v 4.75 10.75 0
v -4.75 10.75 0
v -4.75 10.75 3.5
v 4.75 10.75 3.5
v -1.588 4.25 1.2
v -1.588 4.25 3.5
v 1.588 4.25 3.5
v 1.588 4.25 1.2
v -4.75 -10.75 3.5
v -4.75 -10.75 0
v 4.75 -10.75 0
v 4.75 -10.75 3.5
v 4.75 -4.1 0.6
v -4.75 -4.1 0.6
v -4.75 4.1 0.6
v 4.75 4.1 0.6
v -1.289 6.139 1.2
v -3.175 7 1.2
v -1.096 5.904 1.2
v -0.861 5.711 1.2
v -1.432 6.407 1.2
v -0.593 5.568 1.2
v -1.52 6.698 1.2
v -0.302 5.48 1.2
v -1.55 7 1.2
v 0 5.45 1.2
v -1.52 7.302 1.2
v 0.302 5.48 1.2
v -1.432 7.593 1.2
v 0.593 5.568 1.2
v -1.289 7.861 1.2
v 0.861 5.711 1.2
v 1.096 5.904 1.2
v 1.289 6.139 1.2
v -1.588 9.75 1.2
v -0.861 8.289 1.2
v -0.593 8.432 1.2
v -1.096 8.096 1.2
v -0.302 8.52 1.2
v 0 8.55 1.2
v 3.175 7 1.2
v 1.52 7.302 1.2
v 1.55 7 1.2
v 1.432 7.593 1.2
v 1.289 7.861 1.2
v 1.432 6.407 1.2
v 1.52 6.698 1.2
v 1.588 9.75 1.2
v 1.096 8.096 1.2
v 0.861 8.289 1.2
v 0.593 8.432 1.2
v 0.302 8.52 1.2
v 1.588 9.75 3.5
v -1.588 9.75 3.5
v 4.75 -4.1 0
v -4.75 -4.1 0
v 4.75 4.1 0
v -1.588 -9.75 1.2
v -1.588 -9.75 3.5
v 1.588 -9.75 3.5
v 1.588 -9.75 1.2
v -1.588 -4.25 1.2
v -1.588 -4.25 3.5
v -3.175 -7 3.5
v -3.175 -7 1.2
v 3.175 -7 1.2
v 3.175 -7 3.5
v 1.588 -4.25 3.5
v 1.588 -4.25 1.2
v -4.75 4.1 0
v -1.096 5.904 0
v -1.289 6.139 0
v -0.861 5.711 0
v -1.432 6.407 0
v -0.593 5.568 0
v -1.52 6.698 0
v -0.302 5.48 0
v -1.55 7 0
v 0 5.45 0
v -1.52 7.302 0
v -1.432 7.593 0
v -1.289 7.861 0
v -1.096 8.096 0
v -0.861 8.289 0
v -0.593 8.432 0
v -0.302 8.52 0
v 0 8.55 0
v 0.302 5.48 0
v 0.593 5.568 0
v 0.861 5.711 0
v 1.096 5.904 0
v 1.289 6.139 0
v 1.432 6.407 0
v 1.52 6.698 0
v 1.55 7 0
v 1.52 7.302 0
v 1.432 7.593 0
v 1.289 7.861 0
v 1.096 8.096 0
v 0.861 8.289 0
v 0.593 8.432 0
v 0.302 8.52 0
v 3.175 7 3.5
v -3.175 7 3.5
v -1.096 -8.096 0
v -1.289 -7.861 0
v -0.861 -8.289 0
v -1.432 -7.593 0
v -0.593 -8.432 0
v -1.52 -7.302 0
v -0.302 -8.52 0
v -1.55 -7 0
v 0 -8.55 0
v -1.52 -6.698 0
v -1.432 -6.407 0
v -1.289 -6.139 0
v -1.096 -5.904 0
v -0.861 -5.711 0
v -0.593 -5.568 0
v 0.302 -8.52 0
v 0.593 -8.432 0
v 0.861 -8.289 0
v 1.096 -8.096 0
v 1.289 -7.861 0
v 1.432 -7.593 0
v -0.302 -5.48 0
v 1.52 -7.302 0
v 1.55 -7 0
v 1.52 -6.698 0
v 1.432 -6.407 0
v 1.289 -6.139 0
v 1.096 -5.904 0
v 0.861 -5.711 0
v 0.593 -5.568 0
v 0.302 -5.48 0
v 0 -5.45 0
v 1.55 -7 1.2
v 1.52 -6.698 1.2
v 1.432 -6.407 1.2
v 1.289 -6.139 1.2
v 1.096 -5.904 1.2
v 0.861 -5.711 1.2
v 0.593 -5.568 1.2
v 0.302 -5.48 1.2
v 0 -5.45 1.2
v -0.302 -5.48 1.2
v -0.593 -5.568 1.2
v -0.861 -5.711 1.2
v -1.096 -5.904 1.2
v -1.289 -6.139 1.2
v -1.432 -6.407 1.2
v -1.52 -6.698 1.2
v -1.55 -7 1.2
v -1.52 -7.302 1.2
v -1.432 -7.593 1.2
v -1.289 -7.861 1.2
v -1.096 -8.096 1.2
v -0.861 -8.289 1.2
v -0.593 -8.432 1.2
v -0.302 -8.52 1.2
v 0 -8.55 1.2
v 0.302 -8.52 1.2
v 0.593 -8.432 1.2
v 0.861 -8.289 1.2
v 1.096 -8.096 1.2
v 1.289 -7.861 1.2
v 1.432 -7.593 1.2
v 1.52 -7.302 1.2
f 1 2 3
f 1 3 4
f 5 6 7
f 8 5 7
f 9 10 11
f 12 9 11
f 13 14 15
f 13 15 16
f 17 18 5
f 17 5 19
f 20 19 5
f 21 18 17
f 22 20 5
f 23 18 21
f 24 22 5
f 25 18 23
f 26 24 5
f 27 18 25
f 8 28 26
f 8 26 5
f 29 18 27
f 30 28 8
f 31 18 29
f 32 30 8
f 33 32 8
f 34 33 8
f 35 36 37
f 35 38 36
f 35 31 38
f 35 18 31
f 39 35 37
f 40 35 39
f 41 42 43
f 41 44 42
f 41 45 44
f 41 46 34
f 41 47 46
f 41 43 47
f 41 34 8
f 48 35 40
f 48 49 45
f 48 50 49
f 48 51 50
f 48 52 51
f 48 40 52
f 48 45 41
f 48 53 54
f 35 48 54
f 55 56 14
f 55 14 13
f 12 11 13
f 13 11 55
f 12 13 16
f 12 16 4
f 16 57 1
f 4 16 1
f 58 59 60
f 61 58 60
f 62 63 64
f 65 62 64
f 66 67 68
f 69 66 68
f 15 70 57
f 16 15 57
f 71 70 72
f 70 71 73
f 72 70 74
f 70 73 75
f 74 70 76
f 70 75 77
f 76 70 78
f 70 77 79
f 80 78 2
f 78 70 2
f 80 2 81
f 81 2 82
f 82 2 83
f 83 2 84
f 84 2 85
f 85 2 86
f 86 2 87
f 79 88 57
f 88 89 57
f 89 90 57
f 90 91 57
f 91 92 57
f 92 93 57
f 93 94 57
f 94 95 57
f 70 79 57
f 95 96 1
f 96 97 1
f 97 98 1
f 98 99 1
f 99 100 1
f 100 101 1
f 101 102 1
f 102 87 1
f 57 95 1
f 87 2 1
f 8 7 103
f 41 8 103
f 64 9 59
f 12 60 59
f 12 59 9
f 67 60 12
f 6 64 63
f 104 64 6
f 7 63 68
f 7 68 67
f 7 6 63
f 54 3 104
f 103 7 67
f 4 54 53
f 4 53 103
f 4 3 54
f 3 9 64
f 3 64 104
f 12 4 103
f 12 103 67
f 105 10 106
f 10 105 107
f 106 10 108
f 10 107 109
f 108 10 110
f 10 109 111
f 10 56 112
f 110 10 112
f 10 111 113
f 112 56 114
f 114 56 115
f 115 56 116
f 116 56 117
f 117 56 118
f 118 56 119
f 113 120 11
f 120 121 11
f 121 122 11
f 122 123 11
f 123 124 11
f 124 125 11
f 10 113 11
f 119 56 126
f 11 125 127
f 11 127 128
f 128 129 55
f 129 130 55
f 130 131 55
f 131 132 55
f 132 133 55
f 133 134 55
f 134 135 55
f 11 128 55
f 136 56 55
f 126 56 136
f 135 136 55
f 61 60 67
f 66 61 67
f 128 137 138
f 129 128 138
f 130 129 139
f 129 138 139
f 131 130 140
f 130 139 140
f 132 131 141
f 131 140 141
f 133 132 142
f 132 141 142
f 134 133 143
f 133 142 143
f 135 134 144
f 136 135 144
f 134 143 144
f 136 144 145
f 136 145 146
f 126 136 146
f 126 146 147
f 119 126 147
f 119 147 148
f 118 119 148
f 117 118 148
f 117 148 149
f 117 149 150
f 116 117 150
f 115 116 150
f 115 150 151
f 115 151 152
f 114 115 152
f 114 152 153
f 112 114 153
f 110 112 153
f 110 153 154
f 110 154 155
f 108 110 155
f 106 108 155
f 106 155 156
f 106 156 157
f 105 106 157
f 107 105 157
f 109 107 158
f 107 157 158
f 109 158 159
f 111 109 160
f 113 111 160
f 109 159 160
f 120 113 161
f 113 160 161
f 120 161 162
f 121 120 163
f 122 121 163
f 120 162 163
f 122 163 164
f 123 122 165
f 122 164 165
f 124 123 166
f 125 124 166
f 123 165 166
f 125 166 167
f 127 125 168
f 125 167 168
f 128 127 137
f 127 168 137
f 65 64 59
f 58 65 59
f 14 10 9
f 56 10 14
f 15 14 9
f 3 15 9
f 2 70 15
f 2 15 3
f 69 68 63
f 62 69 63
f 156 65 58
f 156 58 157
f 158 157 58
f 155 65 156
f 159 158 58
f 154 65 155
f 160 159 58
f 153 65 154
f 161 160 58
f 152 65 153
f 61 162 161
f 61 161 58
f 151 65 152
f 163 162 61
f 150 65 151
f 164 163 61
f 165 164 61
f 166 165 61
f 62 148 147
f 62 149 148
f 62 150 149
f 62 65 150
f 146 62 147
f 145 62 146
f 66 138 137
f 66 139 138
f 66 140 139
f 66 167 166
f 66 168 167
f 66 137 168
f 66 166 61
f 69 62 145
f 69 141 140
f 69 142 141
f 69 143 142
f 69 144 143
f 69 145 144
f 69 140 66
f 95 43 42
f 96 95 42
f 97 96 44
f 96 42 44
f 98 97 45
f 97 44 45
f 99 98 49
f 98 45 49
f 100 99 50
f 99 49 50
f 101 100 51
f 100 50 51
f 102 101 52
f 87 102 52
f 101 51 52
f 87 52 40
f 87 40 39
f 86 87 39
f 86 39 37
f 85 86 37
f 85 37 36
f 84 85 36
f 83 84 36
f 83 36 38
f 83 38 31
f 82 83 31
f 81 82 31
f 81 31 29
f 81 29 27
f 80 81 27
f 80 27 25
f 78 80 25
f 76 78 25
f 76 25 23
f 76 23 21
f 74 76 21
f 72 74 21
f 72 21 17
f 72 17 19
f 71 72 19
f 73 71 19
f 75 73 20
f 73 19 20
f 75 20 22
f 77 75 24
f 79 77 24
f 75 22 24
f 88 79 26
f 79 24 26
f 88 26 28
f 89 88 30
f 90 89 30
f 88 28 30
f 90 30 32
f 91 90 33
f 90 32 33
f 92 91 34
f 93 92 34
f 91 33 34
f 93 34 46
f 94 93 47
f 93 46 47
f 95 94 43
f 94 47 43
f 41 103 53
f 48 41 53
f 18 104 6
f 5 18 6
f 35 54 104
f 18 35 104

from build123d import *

# Parameters (mm, degrees)
F0_W     = 9.5
F0_H     = 21.5
F1_DEPTH = 3.5
F2_R     = 1.55
F3_DEPTH = 3.5
F4_W     = 9.5
F4_H     = 8.2
F5_DEPTH = 0.6
F7_DEPTH = 2.3


with BuildPart() as f1:
    # F0 (on Top) → F1 (new body)
    with BuildSketch(Plane.XY):
        Rectangle(F0_W, F0_H)
    extrude(amount=F1_DEPTH)

    # F2 (on face) → F3 (cut, through all)
    with BuildSketch(Plane.XY.offset(3.5)):
        with Locations((0, 7)):
            Circle(F2_R)
        with Locations((0, -7)):
            Circle(F2_R)
    extrude(amount=-F3_DEPTH, mode=Mode.SUBTRACT)

    # F4 (on face) → F5 (cut)
    with BuildSketch(Plane(origin=(0, 0, 0), x_dir=(1, 0, 0), z_dir=(0, 0, -1))):
        Rectangle(F4_W, F4_H)
    extrude(amount=-F5_DEPTH, mode=Mode.SUBTRACT)

    # F6 (on face) → F7 (cut)
    with BuildSketch(Plane.XY.offset(3.5)):
        Polygon((1.587713, 4.25), (3.175426, 7), (1.587713, 9.75), (-1.587713, 9.75), (-3.175426, 7), (-1.587713, 4.25), align=None)
        Polygon((1.587713, -9.75), (3.175426, -7), (1.587713, -4.25), (-1.587713, -4.25), (-3.175426, -7), (-1.587713, -9.75), align=None)
    extrude(amount=-F7_DEPTH, mode=Mode.SUBTRACT)


solid = f1.part
